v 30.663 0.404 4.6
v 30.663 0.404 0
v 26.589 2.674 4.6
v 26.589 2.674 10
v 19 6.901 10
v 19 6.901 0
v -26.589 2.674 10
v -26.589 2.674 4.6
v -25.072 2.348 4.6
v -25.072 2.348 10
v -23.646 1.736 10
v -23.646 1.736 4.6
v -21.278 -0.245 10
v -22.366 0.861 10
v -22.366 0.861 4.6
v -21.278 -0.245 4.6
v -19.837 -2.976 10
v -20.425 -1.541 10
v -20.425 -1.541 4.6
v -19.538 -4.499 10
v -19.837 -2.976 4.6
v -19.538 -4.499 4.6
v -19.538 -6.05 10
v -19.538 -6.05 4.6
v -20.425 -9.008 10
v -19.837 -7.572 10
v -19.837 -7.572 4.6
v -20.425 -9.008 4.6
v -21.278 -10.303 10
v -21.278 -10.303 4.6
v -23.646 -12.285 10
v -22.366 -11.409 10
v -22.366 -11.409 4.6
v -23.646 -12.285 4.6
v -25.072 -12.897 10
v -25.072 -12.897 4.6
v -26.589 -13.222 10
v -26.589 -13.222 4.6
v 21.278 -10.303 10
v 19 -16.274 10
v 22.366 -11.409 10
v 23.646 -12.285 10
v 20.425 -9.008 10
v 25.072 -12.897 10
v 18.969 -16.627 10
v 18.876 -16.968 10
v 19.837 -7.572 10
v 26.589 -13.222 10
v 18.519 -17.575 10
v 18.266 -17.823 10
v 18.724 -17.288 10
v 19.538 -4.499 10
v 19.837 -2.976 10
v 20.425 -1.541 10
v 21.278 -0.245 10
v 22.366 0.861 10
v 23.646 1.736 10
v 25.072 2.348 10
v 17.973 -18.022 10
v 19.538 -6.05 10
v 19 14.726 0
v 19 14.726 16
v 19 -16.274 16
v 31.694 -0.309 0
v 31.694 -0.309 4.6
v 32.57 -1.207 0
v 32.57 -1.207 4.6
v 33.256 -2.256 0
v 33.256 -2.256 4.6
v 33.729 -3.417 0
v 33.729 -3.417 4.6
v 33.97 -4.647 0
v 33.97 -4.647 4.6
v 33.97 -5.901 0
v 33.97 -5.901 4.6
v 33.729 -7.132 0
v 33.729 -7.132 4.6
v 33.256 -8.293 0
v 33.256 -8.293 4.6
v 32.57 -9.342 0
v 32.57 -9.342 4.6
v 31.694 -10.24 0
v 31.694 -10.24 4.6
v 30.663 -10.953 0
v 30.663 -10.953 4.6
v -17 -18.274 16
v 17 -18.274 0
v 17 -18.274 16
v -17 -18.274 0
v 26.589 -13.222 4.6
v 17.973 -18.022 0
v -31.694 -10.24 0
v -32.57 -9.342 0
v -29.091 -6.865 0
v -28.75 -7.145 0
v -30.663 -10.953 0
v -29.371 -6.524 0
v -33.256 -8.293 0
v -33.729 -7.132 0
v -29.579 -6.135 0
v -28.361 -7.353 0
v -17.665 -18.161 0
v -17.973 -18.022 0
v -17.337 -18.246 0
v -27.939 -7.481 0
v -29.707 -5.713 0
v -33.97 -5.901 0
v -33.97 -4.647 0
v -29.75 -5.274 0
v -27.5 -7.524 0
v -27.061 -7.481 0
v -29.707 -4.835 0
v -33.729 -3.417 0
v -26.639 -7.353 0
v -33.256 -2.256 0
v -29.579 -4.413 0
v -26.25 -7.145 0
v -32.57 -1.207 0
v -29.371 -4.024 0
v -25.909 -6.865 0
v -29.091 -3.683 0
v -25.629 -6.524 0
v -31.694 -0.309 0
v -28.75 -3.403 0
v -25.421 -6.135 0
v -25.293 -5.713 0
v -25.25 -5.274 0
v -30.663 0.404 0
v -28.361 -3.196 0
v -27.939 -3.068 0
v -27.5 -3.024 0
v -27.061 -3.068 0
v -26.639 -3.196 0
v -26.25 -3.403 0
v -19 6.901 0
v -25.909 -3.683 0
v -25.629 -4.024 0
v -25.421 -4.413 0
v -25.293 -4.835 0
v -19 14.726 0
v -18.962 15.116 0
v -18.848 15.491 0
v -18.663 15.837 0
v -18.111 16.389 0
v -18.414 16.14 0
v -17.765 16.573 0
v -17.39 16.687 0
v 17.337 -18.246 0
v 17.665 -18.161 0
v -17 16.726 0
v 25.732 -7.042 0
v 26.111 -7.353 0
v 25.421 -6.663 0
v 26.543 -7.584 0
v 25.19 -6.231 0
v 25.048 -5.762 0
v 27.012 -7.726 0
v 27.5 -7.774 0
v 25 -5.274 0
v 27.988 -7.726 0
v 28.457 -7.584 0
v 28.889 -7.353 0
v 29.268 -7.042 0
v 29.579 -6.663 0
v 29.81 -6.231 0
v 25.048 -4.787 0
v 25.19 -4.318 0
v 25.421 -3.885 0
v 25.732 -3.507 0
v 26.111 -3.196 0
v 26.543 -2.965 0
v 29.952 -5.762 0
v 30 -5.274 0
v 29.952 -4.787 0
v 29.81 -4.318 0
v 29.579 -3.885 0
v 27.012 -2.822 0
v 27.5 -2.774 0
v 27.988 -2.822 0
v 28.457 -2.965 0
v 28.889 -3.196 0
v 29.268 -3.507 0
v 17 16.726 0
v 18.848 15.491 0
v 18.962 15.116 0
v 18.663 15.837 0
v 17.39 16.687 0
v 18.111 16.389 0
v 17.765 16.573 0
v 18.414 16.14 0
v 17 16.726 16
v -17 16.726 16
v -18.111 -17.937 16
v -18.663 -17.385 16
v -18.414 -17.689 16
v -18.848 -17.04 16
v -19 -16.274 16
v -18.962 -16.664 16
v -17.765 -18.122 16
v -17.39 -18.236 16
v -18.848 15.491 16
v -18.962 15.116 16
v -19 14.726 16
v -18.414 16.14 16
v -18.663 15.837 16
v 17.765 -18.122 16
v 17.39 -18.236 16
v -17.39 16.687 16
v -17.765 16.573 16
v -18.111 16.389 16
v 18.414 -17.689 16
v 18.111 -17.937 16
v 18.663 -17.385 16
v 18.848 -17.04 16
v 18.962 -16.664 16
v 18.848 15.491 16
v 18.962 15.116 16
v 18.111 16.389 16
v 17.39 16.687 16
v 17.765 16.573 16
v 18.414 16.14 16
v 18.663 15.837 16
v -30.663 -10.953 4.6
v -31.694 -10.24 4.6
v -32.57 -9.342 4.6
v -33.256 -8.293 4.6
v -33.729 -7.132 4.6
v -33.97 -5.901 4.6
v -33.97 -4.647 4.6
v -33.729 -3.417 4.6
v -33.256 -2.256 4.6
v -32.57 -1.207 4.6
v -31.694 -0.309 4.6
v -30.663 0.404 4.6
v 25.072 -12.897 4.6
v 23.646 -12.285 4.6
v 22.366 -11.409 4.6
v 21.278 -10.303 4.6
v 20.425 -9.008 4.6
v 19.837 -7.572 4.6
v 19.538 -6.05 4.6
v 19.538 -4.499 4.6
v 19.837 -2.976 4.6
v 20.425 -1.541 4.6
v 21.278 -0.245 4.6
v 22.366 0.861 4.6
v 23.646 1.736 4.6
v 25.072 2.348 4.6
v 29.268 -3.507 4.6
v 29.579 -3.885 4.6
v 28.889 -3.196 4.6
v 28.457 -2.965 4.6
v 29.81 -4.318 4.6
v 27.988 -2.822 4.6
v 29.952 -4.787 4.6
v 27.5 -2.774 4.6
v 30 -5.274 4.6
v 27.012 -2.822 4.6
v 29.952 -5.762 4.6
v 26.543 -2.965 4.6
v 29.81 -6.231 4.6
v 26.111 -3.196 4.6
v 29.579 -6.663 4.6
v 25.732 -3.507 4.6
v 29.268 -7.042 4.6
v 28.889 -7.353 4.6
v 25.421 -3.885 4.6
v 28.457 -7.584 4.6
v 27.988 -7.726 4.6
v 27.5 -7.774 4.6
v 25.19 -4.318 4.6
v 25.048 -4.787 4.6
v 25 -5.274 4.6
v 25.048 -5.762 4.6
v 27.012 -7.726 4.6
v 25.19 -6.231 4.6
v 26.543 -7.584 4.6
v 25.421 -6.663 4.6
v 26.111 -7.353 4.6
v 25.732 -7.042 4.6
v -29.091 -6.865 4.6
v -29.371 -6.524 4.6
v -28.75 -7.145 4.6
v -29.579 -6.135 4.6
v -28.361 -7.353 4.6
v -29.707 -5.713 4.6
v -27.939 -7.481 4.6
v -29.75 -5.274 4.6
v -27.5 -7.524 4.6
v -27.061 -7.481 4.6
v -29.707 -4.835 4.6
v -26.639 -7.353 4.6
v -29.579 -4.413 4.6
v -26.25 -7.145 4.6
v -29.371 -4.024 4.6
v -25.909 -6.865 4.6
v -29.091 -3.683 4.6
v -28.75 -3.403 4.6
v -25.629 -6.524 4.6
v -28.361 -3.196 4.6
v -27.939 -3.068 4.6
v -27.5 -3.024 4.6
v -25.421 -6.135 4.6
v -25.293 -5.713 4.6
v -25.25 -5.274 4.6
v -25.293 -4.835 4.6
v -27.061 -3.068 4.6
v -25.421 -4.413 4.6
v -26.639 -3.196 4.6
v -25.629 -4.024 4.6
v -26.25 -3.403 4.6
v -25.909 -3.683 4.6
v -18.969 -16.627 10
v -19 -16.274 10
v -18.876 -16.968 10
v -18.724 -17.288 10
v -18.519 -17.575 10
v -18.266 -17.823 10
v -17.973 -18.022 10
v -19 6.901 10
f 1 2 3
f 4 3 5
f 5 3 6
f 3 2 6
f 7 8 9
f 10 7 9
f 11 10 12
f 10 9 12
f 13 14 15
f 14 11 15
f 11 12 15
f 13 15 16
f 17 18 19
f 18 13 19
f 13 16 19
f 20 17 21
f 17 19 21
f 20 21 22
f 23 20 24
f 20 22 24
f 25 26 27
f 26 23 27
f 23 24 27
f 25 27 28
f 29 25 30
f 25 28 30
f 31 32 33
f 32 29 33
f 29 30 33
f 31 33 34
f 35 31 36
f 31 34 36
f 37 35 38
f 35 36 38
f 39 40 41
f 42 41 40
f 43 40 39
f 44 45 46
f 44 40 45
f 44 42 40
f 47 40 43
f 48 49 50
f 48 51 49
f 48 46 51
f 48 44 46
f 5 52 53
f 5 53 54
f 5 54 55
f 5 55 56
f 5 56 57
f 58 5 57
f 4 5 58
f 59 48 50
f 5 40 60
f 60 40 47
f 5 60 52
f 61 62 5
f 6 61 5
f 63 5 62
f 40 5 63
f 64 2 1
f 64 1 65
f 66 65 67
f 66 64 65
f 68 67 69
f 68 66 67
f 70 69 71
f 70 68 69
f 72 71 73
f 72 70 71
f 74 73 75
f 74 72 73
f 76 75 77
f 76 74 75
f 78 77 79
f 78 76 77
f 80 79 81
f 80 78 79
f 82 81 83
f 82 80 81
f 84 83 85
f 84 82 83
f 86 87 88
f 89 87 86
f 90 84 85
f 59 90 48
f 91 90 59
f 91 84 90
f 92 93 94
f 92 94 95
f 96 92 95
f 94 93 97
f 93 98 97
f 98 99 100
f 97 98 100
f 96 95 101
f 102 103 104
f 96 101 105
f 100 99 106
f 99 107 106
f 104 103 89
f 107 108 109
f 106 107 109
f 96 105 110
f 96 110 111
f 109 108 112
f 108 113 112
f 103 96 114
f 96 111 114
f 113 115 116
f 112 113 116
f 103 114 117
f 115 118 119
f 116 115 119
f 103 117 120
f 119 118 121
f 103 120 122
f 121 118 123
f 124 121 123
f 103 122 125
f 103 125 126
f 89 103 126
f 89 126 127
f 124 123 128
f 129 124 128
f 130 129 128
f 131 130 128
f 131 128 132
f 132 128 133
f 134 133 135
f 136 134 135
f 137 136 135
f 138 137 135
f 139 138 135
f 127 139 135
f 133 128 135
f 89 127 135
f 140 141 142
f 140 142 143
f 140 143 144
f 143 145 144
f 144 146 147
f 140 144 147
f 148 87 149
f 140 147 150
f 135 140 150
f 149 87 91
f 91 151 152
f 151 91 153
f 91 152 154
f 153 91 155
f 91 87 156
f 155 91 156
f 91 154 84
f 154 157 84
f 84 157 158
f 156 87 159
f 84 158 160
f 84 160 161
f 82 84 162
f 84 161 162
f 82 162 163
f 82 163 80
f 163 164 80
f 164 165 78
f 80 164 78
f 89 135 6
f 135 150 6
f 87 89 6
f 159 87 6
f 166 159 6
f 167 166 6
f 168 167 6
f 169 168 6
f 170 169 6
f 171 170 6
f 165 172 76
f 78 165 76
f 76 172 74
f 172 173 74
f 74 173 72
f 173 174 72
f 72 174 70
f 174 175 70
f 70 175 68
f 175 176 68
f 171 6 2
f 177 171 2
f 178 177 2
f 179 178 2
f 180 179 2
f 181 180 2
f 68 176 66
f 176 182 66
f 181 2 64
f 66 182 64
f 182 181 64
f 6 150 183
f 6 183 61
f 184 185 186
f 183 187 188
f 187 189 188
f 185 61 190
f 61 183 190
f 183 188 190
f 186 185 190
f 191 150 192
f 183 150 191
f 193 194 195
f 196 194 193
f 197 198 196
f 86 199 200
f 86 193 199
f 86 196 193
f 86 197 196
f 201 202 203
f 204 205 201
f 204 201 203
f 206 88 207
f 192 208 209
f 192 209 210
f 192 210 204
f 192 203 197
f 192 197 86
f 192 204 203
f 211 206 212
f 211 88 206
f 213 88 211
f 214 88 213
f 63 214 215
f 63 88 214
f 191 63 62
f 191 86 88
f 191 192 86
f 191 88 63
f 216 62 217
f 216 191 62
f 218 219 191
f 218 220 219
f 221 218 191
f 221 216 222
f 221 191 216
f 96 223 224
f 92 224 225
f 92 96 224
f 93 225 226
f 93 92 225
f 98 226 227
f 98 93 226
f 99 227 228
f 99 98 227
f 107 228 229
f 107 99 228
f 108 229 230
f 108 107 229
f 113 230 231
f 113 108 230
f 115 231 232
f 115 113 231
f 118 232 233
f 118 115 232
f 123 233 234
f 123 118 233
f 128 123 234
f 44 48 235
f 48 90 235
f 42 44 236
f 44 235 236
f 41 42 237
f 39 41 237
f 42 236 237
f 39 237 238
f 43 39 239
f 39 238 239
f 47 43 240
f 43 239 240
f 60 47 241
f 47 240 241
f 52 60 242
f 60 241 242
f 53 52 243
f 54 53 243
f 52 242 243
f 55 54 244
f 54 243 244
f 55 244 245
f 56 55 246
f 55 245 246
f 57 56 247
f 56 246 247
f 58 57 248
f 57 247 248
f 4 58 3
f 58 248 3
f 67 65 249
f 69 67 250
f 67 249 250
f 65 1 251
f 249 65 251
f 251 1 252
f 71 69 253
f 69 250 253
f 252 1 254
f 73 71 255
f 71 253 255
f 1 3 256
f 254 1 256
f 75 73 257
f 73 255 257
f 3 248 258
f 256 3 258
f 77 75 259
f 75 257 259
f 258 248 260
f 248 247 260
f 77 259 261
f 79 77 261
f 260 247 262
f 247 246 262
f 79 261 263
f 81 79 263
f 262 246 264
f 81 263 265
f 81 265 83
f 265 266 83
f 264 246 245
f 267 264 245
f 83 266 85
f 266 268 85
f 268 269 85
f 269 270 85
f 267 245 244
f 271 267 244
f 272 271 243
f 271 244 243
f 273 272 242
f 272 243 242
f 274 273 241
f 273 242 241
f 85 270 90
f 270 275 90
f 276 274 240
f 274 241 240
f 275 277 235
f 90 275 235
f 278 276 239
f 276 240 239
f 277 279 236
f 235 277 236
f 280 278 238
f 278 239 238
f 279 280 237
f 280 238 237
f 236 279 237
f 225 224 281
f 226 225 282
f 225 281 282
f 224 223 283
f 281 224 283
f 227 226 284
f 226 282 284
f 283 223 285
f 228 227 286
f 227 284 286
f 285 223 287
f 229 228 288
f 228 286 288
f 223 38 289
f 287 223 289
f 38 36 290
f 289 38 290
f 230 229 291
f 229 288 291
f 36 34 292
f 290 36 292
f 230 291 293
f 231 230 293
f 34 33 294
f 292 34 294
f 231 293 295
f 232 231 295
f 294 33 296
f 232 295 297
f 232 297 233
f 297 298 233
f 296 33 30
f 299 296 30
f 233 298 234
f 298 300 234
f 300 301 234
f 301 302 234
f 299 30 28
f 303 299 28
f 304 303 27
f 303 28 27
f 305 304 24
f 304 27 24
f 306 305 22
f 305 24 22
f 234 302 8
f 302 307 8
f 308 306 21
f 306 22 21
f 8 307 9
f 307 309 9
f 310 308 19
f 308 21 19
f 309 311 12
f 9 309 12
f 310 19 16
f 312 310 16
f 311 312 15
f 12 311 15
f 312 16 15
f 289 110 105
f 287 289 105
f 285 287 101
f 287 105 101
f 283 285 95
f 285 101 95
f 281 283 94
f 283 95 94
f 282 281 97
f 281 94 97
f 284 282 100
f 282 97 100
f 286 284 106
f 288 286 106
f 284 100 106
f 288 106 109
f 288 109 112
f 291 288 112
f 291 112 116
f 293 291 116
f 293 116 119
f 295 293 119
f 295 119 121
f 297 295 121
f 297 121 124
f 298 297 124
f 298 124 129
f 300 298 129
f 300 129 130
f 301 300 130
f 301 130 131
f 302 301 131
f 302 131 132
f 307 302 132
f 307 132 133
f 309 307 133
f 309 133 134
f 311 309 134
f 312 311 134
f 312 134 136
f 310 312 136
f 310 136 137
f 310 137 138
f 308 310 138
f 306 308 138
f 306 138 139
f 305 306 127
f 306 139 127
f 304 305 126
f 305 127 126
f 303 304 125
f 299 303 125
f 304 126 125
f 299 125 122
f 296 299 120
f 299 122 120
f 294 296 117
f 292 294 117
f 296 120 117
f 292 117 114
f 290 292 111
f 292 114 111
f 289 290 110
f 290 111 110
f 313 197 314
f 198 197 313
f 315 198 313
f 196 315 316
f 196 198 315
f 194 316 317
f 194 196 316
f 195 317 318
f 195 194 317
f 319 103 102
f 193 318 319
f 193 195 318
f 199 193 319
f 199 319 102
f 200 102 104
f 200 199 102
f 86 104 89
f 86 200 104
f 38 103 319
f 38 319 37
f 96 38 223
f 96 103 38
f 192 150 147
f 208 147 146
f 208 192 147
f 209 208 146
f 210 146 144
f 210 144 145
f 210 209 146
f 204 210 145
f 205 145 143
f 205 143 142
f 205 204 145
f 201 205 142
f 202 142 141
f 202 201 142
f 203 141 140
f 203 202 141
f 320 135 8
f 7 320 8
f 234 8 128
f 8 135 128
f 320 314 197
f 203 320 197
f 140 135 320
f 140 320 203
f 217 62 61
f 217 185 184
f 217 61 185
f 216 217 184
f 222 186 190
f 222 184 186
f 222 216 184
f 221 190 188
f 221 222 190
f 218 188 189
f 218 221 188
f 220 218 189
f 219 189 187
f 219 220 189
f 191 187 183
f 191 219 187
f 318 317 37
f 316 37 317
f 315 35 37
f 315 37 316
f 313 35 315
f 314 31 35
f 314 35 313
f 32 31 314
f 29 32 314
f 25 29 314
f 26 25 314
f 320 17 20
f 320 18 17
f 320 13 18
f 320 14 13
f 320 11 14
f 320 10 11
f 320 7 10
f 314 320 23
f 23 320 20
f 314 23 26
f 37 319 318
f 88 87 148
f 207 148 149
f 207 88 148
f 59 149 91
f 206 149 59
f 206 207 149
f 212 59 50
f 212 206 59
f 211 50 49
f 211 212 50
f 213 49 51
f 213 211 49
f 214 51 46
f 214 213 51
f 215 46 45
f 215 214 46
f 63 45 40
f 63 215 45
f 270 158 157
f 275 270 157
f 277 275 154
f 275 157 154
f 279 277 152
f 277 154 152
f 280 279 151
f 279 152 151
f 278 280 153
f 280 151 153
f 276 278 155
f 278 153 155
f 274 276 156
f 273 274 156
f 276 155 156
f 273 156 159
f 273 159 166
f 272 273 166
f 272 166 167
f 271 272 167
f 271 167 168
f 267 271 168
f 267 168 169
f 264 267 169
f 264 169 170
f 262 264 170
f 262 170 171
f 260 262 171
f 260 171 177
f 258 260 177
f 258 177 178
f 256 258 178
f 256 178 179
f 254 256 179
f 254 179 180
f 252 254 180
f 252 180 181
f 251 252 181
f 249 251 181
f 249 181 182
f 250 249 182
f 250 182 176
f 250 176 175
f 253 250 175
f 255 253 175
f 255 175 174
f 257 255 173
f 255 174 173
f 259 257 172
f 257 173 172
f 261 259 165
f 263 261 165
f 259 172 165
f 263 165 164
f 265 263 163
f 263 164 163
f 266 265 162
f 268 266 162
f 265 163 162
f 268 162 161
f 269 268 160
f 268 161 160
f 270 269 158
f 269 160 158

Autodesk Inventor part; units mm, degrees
ref_plane "XZ Plane" through (0, 0, 0) normal (0, 1, 0) x (-1, 0, 0)
sketch "Sketch1" plane through (0, 0, 0) normal (0, 0, 1) x (1, 0, 0)
  line L0 (-19, 16.7257) -> (19, 16.7257)
  line L1 (19, 16.7257) -> (19, -18.2743)
  line L2 (19, -18.2743) -> (-19, -18.2743)
  line L3 (-19, -18.2743) -> (-19, 16.7257)
  line L4 (0, 21.1891) -> (0, -25.1053) construction
  line L5 (31.0331, 0) -> (-23.8841, 0) construction
  point P0 (0, 0)
  dimension "d0" = 38
  dimension "d1" = 35
extrude "Extrusion1" add sketch "Sketch1" along normal blind 16
fillet "Fillet1" radius 2 4 edges at (19, 16.7257, 8) (19, -18.2743, 8) (-19, 16.7257, 8) (-19, -18.2743, 8)
sketch "Sketch2" plane through (0, 0, 0) normal (0, 0, 1) x (1, 0, 0)
  line L0 (-19, 14.7257) -> (-19, -16.2743) projected
  line L1 (17, 16.7257) -> (-17, 16.7257) projected
  line L2 (19, -16.2743) -> (19, 14.7257) projected
  line L3 (-17, -18.2743) -> (17, -18.2743) projected
  arc A0 (30.6631, -10.9527) -> (30.6631, 0.4041) centre (27.5, -5.2743) ccw
  line L4 (30.6631, 0.4041) -> (19, 6.901)
  line L5 (-28.9465, 0) -> (40.6791, 0) projected
  line L6 (0, 23.9357) -> (0, -26.5345) projected
  arc A1 (17, -18.2743) -> (19, -16.2743) centre (17, -16.2743) ccw projected
  line L7 (30.6631, -10.9527) -> (17.9733, -18.0215)
  line L8 (19, 6.901) -> (19, -16.2743)
  arc A2 (17.9733, -18.0215) -> (19, -16.2743) centre (17, -16.2743) ccw
  point P0 (0, 0)
  dimension "d5" = 27.5
  dimension "d6" = 13
  dimension "d7" = 6.5
  dimension "d8" = 29.12
  dimension "d9" = 29.12
extrude "Extrusion2" add sketch "Sketch2" along normal blind 10 contours L2 L5 A0 L7 A1 | L2 L4 A0 L5
sketch "Sketch3" plane through (0, 0, 10) normal (0, 0, 1) x (1, 0, 0)
  arc A0 (30.6631, -10.9527) -> (30.6631, 0.4041) centre (27.5, -5.2743) ccw construction
  point P0 (0, 0)
hole "Hole1" at (27.5, -5.2743, 10) direction (0, 0, -1) diameter 16 depth 5.4
mirror "Mirror1" about plane through (0, 0, 0) normal (1, 0, 0) of "Extrusion2", "Hole1"
sketch "Sketch4" plane through (27.5, -5.2743, 4.6) normal (0, 0, 1) x (1, 0, 0)
  arc A0 (3.1631, -5.6784) -> (3.1631, 5.6784) centre (0, 0) ccw construction
  line L0 (-58.1631, 5.6784) -> (-54.0889, 7.9479) construction
  arc A1 (-58.1631, 5.6784) -> (-58.1631, -5.6784) centre (-55, 0) ccw construction
  line L1 (-54.0889, -7.9479) -> (-58.1631, -5.6784) construction
  arc A2 (-54.0889, -7.9479) -> (-54.0889, 7.9479) centre (-55, 0) ccw construction
  point P0 (-27.5, 5.2743)
hole "Hole2" at (27.5, -5.2743, 4.6) direction (0, 0, -1) diameter 5 end through all
sketch "Sketch5" plane through (-27.5, -5.2743, 4.6) normal (0, 0, 1) x (1, 0, 0)
  arc A0 (-3.1631, 5.6784) -> (-3.1631, -5.6784) centre (0, 0) ccw construction
  point P0 (27.5, 5.2743)
hole "Hole3" at (-27.5, -5.2743, 4.6) direction (0, 0, -1) diameter 4.5 end through all
equation "\"d9\" = d8"
properties part number "TPS"
